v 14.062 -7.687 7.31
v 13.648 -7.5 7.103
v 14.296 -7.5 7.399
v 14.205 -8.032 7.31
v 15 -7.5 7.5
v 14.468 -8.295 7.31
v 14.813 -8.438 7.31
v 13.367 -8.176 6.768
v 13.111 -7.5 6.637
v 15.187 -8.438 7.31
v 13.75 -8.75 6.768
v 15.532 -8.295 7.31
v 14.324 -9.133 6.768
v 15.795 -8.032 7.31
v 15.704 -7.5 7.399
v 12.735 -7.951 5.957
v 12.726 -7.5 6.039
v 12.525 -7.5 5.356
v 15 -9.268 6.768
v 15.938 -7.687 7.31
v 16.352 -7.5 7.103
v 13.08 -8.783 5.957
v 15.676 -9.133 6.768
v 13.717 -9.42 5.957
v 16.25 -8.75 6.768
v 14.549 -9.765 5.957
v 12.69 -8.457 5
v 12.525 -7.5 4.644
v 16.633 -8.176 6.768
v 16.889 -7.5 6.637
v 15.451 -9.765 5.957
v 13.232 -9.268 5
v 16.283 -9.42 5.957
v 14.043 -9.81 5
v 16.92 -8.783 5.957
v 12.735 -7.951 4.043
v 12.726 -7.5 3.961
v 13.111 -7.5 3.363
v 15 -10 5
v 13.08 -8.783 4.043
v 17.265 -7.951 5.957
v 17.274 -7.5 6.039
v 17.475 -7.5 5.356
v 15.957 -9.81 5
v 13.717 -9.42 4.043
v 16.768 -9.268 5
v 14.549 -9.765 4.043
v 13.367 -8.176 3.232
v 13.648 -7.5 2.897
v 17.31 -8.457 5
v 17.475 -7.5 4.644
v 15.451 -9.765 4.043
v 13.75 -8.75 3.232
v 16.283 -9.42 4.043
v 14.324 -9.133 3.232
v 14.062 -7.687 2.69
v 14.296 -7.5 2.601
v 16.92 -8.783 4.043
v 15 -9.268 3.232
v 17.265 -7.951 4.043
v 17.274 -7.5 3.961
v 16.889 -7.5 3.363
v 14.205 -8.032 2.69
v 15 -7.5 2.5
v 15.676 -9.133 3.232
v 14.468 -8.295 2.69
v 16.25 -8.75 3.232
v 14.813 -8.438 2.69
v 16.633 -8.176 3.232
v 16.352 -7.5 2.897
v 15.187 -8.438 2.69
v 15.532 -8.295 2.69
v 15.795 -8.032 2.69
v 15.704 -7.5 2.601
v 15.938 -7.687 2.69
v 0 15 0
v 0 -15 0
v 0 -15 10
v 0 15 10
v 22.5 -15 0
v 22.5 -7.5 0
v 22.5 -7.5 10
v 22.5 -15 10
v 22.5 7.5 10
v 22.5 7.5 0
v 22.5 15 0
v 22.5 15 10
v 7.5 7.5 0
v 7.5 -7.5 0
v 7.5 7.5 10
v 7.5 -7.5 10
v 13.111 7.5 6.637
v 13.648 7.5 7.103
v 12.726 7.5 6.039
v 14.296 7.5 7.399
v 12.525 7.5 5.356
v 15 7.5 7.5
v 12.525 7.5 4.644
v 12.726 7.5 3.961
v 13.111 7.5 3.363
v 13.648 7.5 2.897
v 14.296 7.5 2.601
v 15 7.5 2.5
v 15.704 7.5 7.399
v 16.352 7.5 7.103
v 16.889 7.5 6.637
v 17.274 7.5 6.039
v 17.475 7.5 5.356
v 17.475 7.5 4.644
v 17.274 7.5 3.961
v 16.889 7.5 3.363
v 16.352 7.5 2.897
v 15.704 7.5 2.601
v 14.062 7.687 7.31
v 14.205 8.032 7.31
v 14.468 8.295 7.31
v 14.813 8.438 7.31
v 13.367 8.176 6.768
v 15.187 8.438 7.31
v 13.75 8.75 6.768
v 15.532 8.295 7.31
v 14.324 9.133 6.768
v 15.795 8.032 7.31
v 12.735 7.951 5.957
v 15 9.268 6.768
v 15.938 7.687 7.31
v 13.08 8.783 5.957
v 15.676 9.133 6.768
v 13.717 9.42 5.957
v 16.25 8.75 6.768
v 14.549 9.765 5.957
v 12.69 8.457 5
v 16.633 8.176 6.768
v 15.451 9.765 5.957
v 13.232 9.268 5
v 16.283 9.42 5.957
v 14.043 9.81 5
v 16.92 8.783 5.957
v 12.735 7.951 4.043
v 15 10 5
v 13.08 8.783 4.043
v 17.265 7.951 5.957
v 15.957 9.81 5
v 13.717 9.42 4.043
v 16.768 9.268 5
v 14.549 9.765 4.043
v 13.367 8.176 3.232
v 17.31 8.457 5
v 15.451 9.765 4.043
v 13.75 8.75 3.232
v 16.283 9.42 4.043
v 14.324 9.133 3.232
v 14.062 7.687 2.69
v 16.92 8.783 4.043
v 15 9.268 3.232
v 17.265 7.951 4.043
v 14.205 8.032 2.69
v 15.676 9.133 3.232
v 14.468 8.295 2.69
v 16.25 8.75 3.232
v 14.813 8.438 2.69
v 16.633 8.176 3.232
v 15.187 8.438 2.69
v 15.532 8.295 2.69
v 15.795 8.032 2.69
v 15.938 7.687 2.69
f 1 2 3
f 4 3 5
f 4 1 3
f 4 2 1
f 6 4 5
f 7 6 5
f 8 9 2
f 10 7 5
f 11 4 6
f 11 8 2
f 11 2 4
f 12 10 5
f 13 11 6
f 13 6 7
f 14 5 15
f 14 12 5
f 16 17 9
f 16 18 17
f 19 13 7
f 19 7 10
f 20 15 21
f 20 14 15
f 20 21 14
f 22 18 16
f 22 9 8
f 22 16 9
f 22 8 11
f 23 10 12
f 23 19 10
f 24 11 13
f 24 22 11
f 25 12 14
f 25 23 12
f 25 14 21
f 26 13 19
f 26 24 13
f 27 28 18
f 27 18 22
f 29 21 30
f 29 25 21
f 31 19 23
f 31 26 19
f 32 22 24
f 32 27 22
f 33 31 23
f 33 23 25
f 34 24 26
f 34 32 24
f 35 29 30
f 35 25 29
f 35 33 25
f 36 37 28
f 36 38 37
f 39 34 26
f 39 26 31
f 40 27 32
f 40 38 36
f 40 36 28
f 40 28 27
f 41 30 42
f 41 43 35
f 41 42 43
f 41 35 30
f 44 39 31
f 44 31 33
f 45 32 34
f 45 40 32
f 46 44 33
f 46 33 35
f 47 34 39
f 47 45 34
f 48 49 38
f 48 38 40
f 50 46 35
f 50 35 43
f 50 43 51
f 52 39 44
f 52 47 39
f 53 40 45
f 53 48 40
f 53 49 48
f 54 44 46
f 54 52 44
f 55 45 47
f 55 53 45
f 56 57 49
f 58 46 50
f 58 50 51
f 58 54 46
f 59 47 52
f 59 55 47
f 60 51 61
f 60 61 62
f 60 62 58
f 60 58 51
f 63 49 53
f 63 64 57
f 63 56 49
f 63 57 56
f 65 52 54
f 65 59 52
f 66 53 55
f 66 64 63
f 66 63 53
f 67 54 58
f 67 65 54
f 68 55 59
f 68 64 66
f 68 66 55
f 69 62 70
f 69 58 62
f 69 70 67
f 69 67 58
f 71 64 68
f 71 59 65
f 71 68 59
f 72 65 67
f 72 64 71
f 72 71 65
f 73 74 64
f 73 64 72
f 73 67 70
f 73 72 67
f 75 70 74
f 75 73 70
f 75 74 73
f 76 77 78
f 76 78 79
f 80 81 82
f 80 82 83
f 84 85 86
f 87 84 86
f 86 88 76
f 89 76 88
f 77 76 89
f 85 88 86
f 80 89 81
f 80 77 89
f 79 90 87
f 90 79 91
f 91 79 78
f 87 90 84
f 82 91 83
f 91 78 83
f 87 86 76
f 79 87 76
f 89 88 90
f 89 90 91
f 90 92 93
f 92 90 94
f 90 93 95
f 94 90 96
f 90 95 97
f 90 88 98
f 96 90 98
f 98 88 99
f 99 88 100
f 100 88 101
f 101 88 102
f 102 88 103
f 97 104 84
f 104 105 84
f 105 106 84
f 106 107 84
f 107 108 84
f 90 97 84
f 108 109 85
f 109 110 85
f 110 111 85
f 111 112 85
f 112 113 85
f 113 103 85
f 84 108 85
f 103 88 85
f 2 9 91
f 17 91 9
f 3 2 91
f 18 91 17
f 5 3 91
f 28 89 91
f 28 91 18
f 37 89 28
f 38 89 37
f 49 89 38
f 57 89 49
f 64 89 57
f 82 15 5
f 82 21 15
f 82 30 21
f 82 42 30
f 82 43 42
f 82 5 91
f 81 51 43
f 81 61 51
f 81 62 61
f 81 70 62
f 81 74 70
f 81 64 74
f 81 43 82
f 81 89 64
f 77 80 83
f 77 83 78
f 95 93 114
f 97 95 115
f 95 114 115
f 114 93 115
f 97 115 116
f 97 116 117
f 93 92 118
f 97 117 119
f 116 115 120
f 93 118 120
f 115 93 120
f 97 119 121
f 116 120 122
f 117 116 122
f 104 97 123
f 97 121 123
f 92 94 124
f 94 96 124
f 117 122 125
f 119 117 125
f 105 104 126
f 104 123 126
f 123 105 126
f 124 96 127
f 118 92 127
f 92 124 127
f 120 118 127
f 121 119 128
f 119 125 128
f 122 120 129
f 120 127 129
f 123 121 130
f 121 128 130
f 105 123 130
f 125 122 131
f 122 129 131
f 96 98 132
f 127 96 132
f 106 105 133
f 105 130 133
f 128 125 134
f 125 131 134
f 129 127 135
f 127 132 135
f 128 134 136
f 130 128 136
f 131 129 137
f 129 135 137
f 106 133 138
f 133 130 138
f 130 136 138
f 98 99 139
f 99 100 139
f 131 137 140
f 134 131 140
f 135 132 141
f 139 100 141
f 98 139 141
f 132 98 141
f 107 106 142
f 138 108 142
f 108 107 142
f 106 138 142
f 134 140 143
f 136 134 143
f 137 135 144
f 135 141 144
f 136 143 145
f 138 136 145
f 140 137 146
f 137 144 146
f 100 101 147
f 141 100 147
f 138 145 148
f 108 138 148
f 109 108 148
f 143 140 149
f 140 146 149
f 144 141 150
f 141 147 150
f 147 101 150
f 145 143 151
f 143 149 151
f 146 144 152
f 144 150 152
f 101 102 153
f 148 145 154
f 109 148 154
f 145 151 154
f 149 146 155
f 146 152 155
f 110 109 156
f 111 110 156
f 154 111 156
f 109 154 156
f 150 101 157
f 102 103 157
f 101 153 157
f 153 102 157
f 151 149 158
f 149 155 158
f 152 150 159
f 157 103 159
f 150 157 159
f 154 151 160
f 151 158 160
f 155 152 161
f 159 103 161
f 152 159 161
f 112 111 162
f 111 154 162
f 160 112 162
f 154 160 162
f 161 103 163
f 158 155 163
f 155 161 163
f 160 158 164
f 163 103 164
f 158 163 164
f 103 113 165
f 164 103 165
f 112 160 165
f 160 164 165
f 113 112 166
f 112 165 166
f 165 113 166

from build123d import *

# Parameters (mm, degrees)
F1_DEPTH = 10


with BuildPart() as f1:
    # F0 (on Top) → F1 (new body)
    with BuildSketch(Plane.XY):
        Polygon((22.5, 7.5), (22.5, 15), (0, 15), (0, 0), (7.5, 0), (7.5, 7.5), align=None)
    extrude(amount=F1_DEPTH)

    # F2 (on face) → F3 (revolve, cut)
    with BuildSketch(Plane.XZ.offset(-7.5)):
        with BuildLine():
            Line((15, 2.5), (15, 7.5))
            ThreePointArc((15, 7.5), (12.5, 5), (15, 2.5))
        make_face()
    revolve(axis=Axis((15, 7.5, 5), (0, 0, -1)), mode=Mode.SUBTRACT)

    # F4: F1 across plane


with BuildPart() as f1_1:
    add(f1.part)
    add(f1.part.mirror(Plane.XZ))


solid = f1_1.part
